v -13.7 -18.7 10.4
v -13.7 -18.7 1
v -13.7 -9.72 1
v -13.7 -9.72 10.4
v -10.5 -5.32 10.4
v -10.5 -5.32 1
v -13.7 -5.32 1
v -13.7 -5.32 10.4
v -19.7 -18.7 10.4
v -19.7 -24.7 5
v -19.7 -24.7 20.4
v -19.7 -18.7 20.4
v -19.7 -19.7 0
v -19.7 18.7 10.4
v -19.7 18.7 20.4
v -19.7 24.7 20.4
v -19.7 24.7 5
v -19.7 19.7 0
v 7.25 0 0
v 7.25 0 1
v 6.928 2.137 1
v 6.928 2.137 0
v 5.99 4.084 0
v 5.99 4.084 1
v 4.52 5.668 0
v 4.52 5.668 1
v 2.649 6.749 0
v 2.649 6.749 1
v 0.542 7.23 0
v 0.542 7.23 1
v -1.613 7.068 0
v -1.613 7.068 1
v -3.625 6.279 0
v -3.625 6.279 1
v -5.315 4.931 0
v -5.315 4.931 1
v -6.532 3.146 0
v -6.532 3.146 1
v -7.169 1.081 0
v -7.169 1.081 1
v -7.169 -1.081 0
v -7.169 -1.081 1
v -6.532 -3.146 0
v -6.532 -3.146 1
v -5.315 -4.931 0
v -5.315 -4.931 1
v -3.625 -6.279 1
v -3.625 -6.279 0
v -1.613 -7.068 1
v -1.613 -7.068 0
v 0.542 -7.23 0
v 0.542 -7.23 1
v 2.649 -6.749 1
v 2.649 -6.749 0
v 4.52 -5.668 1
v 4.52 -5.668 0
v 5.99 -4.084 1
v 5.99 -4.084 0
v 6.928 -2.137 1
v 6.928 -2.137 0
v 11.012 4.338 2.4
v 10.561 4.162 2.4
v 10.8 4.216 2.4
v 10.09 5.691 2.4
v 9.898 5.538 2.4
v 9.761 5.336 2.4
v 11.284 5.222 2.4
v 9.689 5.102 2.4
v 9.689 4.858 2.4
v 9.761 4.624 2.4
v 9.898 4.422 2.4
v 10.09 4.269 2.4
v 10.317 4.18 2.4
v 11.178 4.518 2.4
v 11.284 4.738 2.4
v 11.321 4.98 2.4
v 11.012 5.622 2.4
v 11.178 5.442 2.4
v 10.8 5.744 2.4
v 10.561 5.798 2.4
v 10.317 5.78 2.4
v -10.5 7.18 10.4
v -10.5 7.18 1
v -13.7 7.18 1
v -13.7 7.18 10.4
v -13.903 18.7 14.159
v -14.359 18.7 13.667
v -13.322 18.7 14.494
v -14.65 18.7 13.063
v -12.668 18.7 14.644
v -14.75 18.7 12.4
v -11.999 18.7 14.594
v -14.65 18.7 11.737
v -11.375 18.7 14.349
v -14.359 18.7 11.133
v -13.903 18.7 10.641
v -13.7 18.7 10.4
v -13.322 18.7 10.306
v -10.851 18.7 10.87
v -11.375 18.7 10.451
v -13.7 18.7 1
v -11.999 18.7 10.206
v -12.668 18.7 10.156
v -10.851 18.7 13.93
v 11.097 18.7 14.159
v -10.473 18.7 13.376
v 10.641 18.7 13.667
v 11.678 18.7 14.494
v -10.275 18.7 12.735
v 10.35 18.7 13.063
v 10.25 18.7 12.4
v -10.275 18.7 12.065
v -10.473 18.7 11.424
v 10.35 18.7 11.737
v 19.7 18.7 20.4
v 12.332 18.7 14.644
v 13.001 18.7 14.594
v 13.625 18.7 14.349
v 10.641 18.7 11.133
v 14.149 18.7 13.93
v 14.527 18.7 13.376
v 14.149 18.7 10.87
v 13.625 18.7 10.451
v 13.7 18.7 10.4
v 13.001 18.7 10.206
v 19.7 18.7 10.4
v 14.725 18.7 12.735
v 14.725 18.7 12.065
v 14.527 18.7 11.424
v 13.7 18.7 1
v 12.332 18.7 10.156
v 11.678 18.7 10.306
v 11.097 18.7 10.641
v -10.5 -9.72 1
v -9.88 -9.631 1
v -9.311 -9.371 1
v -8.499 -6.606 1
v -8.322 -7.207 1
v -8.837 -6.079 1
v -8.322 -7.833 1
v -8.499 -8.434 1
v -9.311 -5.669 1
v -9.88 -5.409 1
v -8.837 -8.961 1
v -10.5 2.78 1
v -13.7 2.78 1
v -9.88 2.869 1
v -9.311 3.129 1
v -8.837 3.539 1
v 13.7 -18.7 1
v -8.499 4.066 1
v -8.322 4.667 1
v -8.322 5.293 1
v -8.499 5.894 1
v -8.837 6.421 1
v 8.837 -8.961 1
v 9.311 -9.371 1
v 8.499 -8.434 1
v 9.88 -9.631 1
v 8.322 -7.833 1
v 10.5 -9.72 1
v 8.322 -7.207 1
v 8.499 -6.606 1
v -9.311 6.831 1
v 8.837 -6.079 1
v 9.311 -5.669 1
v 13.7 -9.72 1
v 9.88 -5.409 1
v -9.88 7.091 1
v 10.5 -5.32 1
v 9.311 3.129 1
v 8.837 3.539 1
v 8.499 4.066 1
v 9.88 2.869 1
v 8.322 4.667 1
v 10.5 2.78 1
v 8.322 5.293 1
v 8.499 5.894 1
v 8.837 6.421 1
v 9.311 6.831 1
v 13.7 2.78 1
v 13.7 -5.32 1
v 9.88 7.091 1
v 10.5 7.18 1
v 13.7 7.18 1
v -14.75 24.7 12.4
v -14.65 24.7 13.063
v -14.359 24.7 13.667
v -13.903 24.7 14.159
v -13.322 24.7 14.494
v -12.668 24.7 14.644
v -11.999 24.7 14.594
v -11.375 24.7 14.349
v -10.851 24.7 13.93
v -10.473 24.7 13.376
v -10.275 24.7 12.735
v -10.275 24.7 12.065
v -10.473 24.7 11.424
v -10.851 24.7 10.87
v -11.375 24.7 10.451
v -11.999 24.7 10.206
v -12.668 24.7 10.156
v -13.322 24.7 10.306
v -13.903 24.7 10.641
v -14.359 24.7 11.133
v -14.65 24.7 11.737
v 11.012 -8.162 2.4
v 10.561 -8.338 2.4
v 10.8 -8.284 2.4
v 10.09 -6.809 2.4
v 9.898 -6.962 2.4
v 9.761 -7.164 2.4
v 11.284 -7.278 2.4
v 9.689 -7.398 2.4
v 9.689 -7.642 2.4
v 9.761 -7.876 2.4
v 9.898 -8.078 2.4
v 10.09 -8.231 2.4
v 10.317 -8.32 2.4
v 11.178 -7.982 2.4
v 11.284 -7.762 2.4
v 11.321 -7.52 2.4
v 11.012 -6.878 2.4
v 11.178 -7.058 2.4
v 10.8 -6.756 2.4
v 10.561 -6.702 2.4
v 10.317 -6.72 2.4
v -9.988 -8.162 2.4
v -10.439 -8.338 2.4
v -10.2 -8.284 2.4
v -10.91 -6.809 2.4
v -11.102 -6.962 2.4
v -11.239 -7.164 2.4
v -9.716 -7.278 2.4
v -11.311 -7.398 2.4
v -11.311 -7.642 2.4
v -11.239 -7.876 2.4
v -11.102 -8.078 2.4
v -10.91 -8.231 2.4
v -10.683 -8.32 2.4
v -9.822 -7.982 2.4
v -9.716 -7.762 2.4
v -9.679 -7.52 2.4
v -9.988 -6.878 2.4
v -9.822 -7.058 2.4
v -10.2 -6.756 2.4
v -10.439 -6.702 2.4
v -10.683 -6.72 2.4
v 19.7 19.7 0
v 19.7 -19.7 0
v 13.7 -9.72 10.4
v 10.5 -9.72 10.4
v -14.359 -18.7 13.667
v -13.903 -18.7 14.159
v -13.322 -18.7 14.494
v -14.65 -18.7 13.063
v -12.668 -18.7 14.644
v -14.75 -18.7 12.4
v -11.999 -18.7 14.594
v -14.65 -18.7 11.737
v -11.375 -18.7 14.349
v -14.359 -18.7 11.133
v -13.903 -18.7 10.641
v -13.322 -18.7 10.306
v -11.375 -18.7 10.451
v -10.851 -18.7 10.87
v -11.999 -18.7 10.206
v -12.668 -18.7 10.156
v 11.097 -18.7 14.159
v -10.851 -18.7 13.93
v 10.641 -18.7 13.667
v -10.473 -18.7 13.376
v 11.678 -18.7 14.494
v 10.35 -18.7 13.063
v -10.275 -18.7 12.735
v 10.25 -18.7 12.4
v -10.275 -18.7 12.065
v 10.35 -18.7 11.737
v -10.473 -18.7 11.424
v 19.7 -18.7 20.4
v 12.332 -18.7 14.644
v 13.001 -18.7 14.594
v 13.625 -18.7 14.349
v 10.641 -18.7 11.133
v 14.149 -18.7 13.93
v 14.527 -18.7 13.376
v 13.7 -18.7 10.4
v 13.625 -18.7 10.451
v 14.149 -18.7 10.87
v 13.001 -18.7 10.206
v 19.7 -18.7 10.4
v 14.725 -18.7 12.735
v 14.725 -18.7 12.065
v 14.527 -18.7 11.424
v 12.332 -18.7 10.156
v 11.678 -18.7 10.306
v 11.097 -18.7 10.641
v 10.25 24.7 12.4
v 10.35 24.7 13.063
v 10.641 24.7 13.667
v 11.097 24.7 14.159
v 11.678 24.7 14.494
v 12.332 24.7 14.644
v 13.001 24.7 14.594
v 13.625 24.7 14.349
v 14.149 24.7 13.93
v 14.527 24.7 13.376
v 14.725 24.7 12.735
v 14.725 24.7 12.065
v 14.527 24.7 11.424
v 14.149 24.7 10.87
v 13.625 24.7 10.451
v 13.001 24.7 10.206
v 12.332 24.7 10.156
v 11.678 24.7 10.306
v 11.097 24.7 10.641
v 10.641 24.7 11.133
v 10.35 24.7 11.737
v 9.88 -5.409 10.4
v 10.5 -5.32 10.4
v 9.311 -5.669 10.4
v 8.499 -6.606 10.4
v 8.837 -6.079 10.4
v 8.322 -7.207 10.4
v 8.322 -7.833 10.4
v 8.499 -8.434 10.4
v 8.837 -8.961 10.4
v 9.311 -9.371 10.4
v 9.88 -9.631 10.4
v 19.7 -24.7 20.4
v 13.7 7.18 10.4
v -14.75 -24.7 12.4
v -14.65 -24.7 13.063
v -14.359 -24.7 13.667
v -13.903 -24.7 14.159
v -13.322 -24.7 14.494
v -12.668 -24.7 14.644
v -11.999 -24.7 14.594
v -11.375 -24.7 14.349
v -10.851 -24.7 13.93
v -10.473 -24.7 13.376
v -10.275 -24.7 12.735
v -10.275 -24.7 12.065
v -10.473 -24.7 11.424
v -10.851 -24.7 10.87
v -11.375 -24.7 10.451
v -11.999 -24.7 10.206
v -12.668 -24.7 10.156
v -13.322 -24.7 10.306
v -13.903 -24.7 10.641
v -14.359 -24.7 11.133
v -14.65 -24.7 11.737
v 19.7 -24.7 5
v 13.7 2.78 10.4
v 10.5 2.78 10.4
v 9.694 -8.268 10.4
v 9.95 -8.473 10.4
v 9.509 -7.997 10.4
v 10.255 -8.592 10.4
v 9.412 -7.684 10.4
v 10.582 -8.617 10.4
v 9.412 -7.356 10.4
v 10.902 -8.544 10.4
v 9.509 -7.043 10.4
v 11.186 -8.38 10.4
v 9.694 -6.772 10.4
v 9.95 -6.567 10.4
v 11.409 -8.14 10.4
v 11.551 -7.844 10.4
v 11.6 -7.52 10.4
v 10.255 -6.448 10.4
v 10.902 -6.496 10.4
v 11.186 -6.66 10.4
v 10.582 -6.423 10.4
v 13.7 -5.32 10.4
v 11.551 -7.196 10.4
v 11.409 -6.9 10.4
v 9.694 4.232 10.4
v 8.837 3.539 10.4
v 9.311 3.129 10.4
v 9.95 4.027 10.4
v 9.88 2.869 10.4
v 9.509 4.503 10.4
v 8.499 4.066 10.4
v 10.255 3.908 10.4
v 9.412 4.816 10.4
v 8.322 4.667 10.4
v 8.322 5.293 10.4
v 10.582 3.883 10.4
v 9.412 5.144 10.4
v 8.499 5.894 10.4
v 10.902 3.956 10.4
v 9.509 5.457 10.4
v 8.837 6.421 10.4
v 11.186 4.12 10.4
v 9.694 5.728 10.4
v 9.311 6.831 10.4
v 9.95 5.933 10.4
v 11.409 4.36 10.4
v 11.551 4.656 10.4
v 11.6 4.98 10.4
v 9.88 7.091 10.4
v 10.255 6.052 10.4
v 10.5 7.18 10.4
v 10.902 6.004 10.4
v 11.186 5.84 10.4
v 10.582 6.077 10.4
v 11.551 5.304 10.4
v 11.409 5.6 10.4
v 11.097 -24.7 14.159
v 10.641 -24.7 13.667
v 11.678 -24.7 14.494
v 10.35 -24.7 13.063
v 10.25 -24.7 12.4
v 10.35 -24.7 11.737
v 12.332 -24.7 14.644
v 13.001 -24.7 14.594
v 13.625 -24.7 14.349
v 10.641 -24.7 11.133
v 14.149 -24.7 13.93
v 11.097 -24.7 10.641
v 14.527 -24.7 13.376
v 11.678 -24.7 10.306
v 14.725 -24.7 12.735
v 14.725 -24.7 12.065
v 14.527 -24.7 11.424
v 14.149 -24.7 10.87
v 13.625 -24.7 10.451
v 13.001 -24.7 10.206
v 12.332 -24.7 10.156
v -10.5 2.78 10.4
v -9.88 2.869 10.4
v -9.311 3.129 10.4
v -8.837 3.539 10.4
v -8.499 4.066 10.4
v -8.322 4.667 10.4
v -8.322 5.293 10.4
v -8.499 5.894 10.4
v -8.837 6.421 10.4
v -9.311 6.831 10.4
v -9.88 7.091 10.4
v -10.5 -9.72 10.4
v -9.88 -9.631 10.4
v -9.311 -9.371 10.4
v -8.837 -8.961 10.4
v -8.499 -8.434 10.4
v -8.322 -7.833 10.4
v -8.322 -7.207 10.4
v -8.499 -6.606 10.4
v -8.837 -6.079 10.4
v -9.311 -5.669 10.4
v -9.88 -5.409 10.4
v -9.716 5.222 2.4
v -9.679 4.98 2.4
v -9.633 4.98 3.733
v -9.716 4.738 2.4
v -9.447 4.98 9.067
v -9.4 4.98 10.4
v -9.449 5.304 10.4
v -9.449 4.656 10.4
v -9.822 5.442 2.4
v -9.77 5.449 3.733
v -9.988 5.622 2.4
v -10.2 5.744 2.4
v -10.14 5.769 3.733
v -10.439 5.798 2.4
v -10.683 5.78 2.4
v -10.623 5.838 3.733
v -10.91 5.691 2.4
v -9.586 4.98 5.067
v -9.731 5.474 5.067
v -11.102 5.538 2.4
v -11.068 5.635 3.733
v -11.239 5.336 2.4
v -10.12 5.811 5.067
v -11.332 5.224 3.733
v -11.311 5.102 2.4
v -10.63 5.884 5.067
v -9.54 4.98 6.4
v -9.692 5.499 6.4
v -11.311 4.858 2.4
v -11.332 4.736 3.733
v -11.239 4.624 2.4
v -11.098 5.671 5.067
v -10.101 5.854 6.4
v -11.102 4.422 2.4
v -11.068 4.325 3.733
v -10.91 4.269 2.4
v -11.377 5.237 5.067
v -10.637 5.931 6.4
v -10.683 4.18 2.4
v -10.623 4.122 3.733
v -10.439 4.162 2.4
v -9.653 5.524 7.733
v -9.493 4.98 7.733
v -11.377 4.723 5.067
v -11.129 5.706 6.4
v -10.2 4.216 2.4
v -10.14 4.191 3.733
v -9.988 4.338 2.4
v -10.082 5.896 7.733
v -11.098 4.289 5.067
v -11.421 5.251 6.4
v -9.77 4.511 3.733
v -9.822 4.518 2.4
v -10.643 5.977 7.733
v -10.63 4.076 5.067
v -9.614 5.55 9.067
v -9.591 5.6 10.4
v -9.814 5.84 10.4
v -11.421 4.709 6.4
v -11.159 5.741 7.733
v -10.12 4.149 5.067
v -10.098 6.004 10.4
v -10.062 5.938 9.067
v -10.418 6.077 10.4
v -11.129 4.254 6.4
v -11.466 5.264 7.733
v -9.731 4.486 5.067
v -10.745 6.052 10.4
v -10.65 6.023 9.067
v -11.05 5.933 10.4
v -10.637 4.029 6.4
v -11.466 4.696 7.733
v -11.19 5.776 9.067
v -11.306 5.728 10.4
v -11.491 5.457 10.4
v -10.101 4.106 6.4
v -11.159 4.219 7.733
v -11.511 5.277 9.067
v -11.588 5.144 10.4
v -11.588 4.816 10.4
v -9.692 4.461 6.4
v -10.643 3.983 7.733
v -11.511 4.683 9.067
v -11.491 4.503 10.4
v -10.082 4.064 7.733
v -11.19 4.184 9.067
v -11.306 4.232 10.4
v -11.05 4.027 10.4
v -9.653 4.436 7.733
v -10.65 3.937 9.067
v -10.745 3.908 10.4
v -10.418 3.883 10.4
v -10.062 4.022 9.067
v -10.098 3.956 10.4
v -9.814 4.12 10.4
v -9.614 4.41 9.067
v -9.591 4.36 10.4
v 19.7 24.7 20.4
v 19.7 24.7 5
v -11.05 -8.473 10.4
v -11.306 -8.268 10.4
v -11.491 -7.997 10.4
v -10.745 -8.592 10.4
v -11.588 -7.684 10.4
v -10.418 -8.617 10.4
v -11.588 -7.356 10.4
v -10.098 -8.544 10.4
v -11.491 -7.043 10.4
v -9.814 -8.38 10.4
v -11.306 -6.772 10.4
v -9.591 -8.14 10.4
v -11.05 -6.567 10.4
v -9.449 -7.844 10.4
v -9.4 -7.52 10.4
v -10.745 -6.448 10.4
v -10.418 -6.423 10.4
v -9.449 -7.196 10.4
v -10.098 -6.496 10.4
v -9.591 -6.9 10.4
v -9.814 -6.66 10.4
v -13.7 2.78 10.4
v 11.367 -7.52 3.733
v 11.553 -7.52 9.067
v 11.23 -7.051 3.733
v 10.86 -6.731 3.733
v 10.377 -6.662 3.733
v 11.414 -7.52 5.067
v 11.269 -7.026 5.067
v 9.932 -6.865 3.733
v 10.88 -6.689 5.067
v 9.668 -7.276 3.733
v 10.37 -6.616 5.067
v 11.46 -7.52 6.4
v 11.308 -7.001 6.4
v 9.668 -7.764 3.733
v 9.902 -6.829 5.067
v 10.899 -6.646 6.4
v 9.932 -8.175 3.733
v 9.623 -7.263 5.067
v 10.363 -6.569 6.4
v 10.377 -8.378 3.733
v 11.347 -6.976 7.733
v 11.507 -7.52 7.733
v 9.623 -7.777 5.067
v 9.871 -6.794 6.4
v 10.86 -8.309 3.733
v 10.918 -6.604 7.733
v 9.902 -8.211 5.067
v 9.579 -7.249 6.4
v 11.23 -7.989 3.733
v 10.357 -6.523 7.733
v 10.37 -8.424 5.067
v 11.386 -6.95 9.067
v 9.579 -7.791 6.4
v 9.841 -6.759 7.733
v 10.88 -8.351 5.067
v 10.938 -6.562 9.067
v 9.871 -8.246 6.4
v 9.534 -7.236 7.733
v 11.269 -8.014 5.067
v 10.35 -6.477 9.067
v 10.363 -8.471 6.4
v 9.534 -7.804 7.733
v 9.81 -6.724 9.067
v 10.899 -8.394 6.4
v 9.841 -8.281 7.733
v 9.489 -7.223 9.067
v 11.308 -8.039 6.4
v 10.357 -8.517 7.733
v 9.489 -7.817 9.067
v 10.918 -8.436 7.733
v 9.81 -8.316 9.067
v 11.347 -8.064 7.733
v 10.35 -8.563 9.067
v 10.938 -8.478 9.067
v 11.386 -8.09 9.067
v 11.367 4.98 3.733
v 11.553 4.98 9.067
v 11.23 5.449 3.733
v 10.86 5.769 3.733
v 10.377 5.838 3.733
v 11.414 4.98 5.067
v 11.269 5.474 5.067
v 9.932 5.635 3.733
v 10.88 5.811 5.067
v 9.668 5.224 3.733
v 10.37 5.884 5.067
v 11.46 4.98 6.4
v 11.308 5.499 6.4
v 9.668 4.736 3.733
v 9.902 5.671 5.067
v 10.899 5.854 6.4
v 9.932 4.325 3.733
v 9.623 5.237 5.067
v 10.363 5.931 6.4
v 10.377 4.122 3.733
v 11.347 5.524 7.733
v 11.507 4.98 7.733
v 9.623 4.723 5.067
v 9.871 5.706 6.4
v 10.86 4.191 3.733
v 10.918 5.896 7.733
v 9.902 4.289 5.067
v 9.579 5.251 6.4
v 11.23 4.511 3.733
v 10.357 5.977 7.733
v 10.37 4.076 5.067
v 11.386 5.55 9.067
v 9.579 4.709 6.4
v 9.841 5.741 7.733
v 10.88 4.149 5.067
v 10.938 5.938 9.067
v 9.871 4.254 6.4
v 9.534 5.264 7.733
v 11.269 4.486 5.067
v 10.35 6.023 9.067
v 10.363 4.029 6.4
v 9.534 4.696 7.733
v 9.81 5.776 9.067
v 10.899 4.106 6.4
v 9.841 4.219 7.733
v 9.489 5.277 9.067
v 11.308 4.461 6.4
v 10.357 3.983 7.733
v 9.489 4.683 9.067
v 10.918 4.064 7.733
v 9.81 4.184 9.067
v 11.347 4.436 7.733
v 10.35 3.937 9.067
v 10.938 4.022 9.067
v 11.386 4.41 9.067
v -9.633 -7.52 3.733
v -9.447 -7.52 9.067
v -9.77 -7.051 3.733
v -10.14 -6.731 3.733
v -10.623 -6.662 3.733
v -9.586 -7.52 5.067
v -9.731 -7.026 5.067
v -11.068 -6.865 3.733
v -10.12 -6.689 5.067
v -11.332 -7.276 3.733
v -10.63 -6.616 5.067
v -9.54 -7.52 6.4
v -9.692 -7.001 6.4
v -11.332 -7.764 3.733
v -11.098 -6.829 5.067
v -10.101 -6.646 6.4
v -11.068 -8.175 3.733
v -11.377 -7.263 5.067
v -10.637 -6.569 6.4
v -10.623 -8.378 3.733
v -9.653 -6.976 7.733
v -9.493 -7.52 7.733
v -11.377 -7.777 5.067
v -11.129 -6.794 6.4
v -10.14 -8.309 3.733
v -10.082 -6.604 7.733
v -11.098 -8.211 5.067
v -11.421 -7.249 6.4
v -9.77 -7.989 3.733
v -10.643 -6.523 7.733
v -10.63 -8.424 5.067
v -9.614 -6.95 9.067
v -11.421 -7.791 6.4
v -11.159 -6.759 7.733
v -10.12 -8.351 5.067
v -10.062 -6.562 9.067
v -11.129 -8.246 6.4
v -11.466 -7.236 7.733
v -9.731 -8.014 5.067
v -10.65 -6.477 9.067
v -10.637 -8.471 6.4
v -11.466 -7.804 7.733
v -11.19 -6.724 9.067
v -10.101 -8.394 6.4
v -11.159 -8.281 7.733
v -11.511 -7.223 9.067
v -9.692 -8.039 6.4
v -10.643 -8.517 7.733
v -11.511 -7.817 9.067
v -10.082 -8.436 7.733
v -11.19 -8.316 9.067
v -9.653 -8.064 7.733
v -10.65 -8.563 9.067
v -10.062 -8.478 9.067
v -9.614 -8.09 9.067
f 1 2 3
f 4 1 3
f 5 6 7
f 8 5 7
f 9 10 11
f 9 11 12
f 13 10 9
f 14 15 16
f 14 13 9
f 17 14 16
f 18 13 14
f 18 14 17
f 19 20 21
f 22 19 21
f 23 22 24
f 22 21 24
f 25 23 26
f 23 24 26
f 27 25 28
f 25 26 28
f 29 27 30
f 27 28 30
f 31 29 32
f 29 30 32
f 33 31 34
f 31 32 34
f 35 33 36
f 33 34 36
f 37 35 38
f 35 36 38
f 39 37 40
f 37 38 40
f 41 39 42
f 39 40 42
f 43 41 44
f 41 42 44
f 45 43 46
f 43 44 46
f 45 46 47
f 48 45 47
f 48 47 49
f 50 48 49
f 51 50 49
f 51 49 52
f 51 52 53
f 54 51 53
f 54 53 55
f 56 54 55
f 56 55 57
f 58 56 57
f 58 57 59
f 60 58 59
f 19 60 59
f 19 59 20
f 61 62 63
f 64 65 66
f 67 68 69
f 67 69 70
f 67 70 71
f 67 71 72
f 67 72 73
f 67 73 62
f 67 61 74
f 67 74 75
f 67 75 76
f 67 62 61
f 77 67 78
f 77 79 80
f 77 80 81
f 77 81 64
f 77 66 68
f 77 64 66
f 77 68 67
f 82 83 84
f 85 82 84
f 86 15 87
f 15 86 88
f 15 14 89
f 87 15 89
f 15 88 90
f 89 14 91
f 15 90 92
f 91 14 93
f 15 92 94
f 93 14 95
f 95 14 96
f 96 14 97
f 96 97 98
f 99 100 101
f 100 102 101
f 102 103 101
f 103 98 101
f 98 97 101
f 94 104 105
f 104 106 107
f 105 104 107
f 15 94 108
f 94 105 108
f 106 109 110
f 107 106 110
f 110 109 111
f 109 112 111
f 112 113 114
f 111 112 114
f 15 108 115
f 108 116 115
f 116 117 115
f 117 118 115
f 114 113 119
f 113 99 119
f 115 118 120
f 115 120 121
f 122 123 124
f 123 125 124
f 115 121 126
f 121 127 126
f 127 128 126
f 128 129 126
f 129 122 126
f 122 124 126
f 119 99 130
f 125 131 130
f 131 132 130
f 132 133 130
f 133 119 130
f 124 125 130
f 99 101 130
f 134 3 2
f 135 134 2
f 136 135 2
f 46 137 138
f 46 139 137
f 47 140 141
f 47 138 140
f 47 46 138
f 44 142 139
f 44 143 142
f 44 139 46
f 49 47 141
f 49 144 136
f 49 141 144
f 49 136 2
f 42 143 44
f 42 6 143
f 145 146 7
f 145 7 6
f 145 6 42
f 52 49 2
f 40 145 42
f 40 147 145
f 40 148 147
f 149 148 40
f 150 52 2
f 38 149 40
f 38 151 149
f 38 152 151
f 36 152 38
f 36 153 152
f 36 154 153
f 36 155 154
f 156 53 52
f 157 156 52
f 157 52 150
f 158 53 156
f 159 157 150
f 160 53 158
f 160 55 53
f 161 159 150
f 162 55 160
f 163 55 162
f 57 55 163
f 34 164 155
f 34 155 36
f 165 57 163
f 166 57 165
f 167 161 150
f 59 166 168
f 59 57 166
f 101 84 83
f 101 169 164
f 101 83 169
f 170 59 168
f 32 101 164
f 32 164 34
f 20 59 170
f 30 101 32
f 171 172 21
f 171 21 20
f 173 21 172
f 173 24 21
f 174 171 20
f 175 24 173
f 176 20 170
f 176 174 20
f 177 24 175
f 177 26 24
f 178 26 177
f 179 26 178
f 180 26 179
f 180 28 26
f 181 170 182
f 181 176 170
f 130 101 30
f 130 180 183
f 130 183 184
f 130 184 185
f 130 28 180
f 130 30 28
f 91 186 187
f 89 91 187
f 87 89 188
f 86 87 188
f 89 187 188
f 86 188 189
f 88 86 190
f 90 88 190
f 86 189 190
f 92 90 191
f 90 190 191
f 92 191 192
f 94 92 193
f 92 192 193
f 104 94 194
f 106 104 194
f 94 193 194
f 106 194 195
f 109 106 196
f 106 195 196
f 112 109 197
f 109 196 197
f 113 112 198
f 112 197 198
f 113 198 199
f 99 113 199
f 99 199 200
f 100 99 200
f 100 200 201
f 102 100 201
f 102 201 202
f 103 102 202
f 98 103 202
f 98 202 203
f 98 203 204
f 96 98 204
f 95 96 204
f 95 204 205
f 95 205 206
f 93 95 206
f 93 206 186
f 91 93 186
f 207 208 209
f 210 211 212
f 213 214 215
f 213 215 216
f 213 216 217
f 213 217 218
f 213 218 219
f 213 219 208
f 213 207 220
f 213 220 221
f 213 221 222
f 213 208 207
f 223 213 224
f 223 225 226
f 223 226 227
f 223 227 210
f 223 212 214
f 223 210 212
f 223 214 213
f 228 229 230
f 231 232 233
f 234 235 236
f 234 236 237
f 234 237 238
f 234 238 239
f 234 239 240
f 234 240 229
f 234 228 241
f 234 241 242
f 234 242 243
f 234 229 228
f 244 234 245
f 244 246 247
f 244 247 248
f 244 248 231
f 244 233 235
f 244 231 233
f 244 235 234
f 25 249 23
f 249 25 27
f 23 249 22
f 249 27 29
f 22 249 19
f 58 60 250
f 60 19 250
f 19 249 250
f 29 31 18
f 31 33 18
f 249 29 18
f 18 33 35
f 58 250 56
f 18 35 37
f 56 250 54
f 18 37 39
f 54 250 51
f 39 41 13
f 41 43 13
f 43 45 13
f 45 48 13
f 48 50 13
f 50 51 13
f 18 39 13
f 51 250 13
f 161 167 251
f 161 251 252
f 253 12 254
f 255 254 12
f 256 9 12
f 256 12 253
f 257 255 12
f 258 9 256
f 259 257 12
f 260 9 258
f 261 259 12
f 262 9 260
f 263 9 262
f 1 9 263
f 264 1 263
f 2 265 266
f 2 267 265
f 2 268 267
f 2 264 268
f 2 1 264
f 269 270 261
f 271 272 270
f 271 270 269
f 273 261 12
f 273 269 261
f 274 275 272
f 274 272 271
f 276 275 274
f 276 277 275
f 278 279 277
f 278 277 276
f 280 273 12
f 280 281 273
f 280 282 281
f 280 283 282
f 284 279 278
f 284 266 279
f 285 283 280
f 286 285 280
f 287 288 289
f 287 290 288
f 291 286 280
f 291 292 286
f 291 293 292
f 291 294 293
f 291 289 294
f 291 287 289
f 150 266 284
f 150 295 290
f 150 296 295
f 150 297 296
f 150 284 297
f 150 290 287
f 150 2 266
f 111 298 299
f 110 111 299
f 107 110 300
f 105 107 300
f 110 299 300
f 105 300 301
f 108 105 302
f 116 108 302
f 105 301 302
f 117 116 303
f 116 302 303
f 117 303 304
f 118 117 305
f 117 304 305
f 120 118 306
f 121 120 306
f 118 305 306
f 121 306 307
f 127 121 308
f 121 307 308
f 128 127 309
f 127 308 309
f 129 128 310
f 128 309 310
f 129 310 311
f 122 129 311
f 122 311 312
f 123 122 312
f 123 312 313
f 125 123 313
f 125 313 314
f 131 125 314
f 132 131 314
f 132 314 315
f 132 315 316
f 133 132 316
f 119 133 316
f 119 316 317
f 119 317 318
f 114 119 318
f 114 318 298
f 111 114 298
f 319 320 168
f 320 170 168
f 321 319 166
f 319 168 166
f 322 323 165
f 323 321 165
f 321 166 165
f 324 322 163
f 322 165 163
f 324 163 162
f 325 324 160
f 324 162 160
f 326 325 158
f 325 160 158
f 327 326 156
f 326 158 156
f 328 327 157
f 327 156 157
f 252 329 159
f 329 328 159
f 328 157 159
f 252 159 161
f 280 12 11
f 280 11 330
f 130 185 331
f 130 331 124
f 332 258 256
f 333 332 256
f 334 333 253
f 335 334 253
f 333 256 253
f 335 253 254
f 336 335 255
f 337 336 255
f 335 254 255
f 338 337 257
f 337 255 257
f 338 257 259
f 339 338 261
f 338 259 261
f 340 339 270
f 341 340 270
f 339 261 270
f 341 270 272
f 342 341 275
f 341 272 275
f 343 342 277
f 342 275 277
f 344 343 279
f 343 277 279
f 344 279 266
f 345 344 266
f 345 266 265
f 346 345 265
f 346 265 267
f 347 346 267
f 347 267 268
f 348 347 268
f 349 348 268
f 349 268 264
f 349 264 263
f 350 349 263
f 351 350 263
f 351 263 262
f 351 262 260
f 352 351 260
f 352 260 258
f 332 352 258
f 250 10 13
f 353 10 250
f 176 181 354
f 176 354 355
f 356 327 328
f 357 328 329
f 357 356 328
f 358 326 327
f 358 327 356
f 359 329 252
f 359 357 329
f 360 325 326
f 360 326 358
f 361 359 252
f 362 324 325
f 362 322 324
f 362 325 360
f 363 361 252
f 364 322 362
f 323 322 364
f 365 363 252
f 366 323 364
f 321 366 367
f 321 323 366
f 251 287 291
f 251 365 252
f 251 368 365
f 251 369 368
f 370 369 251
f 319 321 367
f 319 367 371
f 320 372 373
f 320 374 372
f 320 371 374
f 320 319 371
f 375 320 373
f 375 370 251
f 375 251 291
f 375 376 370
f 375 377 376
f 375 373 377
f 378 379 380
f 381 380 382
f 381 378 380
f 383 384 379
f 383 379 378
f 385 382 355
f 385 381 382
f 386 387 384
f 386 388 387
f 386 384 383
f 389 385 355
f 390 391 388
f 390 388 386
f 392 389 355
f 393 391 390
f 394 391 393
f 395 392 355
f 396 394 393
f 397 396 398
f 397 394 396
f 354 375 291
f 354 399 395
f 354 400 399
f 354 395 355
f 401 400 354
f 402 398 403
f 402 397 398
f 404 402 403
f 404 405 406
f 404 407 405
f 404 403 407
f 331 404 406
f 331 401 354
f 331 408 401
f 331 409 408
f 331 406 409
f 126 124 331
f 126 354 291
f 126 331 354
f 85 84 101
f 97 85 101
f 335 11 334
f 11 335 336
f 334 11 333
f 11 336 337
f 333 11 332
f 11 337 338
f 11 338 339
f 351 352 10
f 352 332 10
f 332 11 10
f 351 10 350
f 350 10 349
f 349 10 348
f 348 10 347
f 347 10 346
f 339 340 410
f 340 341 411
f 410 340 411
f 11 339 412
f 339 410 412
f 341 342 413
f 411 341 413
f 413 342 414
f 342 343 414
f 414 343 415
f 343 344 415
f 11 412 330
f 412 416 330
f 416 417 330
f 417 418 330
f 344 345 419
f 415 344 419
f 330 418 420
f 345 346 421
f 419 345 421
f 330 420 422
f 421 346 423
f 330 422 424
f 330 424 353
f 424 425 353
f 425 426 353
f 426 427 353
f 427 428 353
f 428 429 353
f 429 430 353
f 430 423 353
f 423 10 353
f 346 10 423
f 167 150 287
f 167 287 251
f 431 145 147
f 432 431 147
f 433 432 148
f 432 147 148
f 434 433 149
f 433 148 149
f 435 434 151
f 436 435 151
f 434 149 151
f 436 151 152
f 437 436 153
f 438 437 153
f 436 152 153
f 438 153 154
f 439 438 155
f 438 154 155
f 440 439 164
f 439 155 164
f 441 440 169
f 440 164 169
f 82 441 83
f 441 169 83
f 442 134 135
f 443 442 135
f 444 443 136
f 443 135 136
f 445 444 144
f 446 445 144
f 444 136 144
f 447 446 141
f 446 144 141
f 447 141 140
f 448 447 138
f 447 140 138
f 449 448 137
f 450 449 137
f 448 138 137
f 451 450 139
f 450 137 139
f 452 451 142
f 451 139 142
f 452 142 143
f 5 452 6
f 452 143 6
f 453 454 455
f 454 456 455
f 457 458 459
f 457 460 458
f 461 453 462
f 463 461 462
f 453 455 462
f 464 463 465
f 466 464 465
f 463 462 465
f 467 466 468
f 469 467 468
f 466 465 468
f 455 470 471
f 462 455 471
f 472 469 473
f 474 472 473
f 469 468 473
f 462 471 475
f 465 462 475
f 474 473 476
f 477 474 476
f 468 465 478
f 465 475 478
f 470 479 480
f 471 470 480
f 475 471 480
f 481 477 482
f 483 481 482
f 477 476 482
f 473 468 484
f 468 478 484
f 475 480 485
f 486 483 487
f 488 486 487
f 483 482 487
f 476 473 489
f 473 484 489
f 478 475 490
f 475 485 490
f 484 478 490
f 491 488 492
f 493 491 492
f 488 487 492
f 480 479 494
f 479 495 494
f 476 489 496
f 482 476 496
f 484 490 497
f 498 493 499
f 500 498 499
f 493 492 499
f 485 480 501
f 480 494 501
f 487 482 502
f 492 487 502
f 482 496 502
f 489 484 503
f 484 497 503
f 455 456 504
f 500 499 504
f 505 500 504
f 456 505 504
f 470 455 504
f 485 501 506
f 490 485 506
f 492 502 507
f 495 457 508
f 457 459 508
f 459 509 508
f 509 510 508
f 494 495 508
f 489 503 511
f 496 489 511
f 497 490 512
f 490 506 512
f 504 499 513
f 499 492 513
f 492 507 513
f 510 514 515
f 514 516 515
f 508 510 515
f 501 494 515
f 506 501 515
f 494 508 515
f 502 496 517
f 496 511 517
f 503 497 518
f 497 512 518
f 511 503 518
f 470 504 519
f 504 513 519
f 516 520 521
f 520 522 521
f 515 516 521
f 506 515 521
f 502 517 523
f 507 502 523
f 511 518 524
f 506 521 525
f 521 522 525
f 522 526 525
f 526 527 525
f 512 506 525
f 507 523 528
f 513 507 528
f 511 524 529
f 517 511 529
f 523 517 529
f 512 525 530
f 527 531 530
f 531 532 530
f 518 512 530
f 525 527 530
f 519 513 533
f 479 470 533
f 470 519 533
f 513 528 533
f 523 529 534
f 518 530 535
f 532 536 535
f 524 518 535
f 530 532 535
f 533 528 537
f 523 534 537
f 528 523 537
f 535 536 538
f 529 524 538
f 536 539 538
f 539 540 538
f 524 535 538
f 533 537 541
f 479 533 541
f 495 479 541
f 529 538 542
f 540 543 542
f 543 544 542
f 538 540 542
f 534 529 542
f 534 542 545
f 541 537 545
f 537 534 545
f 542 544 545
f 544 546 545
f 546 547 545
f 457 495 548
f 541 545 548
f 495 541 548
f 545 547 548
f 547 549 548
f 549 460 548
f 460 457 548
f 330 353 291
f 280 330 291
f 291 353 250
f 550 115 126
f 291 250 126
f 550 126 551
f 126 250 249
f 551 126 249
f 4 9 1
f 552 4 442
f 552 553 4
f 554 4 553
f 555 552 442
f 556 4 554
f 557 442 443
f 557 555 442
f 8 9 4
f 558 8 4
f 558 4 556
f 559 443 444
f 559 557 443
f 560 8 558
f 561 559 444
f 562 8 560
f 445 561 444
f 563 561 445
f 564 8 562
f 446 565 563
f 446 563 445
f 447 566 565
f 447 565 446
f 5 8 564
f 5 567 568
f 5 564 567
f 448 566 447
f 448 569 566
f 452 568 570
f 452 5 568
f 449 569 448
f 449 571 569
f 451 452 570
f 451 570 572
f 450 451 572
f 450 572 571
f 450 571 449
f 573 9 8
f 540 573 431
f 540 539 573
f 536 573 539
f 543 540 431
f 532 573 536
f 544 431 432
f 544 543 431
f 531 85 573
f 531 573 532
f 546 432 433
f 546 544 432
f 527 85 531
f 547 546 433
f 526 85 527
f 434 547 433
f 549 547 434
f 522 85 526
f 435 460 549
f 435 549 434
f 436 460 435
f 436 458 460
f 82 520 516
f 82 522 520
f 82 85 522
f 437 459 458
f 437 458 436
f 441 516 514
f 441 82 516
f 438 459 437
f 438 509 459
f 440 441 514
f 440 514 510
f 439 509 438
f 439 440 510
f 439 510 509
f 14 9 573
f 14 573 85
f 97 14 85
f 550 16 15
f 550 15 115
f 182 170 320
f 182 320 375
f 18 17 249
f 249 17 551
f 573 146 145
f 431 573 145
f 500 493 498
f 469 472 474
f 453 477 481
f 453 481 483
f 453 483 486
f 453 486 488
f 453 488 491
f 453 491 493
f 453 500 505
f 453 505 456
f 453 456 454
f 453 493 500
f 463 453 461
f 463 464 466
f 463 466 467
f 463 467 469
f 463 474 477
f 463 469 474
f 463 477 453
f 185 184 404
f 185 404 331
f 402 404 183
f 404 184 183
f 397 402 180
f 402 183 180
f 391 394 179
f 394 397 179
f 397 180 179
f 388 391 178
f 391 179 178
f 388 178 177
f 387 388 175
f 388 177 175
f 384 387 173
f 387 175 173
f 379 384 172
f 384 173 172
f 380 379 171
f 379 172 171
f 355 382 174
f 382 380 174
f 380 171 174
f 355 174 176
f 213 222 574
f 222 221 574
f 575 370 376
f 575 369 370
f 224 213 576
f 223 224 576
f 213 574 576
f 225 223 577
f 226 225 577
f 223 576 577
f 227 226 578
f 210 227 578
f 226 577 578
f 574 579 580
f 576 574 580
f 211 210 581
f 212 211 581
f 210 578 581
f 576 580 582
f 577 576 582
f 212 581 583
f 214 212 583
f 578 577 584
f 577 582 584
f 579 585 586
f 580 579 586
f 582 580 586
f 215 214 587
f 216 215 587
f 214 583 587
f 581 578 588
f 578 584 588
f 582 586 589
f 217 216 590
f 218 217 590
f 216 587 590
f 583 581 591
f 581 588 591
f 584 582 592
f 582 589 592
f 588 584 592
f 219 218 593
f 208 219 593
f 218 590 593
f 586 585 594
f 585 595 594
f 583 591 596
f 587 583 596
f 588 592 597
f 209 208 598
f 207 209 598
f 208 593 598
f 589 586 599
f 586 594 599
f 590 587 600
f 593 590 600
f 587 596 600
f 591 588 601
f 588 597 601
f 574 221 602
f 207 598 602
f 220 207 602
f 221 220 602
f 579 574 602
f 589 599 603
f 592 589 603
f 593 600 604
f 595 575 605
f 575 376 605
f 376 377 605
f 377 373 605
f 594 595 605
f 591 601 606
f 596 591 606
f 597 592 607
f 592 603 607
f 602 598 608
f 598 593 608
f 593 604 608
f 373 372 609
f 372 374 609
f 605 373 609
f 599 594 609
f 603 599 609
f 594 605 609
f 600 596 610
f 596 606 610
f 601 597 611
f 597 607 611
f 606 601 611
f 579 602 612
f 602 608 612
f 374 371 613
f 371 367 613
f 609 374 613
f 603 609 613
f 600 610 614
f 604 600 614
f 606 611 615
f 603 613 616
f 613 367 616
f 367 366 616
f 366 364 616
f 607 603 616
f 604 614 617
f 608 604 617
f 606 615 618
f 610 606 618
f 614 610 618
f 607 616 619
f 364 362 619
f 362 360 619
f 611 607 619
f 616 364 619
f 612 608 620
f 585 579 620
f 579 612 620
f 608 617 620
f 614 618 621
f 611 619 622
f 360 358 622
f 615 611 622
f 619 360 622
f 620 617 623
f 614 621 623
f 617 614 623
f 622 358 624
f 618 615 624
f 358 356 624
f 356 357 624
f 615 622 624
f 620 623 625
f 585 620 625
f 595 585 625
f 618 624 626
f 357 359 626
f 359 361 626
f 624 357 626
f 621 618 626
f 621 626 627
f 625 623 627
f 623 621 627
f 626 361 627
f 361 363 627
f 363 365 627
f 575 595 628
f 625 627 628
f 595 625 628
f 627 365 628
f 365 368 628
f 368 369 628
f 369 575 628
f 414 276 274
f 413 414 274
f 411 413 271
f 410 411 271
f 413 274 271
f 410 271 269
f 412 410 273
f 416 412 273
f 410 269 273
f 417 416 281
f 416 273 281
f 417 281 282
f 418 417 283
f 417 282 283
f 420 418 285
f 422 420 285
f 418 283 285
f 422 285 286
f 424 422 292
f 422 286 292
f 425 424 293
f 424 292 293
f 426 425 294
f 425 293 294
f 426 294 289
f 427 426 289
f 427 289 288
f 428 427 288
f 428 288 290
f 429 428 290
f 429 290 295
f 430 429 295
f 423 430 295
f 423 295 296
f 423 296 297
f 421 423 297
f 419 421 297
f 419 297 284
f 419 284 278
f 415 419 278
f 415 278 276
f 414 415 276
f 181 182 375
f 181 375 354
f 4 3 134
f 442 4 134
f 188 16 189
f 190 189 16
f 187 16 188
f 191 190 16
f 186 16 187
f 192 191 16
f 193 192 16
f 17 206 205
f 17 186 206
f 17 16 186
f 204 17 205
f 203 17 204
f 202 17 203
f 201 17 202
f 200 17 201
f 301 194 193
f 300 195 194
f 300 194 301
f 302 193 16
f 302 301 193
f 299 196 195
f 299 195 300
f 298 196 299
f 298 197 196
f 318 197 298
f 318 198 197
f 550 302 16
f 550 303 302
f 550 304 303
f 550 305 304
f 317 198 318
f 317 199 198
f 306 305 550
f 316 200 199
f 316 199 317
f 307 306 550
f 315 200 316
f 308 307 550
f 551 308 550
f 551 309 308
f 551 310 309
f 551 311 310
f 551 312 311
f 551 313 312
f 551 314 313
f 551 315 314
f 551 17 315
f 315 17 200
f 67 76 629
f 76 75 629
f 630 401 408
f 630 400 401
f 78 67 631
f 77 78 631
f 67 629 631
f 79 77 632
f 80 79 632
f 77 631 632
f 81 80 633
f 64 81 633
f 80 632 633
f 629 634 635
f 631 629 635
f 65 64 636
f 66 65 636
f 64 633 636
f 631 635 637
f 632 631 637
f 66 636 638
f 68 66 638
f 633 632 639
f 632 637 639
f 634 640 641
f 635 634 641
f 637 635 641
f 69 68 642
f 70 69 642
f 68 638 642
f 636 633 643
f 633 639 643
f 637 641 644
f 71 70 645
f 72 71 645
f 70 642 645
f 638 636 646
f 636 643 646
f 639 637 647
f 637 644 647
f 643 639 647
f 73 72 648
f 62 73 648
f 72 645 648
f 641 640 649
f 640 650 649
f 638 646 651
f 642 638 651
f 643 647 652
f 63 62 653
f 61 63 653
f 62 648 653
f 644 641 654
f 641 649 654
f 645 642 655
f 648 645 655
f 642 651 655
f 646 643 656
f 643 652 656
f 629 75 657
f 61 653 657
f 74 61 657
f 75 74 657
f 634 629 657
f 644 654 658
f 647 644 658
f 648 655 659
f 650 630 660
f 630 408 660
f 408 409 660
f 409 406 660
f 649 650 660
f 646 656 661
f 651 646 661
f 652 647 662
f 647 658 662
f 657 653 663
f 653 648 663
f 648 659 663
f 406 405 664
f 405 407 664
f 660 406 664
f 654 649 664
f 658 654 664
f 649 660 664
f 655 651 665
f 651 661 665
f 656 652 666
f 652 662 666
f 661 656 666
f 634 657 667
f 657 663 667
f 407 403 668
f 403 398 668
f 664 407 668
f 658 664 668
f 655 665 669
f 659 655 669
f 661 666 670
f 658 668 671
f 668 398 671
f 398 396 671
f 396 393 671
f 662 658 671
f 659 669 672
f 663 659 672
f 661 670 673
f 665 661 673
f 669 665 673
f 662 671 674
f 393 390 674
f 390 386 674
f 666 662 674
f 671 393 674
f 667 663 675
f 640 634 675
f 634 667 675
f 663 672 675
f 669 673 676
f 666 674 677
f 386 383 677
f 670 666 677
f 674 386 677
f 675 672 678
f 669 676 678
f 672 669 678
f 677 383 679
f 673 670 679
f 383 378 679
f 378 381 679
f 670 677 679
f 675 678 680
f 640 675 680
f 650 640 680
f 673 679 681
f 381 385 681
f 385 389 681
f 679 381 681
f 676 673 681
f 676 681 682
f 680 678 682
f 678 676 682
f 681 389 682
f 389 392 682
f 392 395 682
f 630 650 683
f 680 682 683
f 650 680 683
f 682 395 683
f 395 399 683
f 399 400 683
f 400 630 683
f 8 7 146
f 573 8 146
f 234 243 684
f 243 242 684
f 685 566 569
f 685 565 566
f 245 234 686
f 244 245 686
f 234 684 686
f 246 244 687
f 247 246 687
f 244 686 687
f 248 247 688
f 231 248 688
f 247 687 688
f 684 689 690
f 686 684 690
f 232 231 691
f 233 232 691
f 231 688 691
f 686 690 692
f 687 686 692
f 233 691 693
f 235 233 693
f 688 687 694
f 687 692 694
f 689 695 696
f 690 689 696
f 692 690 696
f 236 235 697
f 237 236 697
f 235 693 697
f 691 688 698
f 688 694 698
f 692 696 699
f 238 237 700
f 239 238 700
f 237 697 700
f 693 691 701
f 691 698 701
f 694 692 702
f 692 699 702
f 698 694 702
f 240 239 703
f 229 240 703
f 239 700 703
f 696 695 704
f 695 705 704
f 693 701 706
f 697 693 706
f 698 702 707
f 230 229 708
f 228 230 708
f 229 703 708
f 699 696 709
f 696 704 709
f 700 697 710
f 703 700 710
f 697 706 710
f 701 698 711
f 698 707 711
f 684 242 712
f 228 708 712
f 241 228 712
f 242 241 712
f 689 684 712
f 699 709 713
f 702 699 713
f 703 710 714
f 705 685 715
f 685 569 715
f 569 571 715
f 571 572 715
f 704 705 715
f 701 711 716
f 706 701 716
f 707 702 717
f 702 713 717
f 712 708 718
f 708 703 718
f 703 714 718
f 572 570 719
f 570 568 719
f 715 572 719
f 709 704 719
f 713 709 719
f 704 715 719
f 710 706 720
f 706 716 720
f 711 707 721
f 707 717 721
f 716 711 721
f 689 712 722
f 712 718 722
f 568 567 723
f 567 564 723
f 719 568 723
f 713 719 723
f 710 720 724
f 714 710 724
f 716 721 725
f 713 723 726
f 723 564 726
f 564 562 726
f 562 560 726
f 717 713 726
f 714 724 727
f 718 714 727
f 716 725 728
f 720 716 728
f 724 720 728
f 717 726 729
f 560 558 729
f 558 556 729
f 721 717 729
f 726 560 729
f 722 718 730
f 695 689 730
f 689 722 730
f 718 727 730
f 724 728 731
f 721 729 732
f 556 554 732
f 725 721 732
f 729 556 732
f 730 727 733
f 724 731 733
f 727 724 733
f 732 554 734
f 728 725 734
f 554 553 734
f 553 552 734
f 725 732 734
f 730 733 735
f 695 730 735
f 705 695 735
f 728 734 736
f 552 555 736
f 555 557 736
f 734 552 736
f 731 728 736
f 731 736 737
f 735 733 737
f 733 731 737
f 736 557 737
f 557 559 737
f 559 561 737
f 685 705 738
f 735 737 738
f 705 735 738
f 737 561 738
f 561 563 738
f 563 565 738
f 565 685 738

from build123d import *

# Parameters (mm, degrees)
SKETCH1_W                    = 39.4
SKETCH1_H                    = 49.4
BOSS_EXTRUDE1_DEPTH          = 1
SKETCH2_R                    = 7.25
CUT_EXTRUDE1_DEPTH           = 32.609808604
BOSS_EXTRUDE2_START          = -1
SKETCH3_R                    = 2.2
SKETCH3_R_2                  = 1
BOSS_EXTRUDE2_DEPTH          = 10.4
SKETCH4_W                    = 39.4
SKETCH4_H                    = 49.4
SKETCH4_W_2                  = 27.4
SKETCH4_H_2                  = 37.4
BOSS_EXTRUDE4_DEPTH          = 9.4
SKETCH5_W                    = 39.4
SKETCH5_H                    = 6
BOSS_EXTRUDE5_DEPTH          = 10
SKETCH6_R                    = 1.65
CUT_EXTRUDE3_DEPTH           = 57.961478211
SKETCH7_R                    = 2.25
CUT_EXTRUDE4_DEPTH           = 57.961478211
BOSS_EXTRUDE6_START          = -9.4
BOSS_EXTRUDE6_DEPTH          = 9.4
SKETCH9_R                    = 1.1
CUT_EXTRUDE5_DEPTH           = 8
CUT_EXTRUDE5_DRAFT           = -2
CUT_EXTRUDE5_PROFILE_2_DEPTH = 8
CUT_EXTRUDE5_PROFILE_2_DRAFT = -2
CUT_EXTRUDE5_PROFILE_3_DEPTH = 8
CUT_EXTRUDE5_PROFILE_3_DRAFT = -2
CUT_EXTRUDE5_PROFILE_4_DEPTH = 8
CUT_EXTRUDE5_PROFILE_4_DRAFT = -2
CHAMFER1_SIZE                = 5


with BuildPart() as part:
    # Sketch1 → Boss-Extrude1 (new body)
    with BuildSketch(Plane.XY):
        Rectangle(SKETCH1_W, SKETCH1_H)
    extrude(amount=BOSS_EXTRUDE1_DEPTH)

    # Sketch2 → Cut-Extrude1 (cut, through all)
    with BuildSketch(Plane.XY.offset(1)):
        Circle(SKETCH2_R)
    extrude(amount=-CUT_EXTRUDE1_DEPTH, mode=Mode.SUBTRACT)

    # Sketch3 → Boss-Extrude2 (add)
    # profile 1 of 4: a face of its own
    with BuildSketch(Plane.XY.offset(1).offset(BOSS_EXTRUDE2_START)):
        with Locations(Location((-10.5, 4.98, 0), (0, 0, 180))):
            Circle(SKETCH3_R)
        with Locations(Location((-10.5, 4.98, 0), (0, 0, 180))):
            Circle(SKETCH3_R_2, mode=Mode.SUBTRACT)
    # profile 2 of 4: a face of its own
    with BuildSketch(Plane.XY.offset(1).offset(BOSS_EXTRUDE2_START)):
        with Locations(Location((-10.5, -7.52, 0), (0, 0, 180))):
            Circle(SKETCH3_R)
        with Locations(Location((-10.5, -7.52, 0), (0, 0, 180))):
            Circle(SKETCH3_R_2, mode=Mode.SUBTRACT)
    # profile 3 of 4: a face of its own
    with BuildSketch(Plane.XY.offset(1).offset(BOSS_EXTRUDE2_START)):
        with Locations(Location((10.5, -7.52, 0), (0, 0, 180))):
            Circle(SKETCH3_R)
        with Locations(Location((10.5, -7.52, 0), (0, 0, 180))):
            Circle(SKETCH3_R_2, mode=Mode.SUBTRACT)
    # profile 4 of 4: a face of its own
    with BuildSketch(Plane.XY.offset(1).offset(BOSS_EXTRUDE2_START)):
        with Locations(Location((10.5, 4.98, 0), (0, 0, 180))):
            Circle(SKETCH3_R)
        with Locations(Location((10.5, 4.98, 0), (0, 0, 180))):
            Circle(SKETCH3_R_2, mode=Mode.SUBTRACT)
    extrude(amount=BOSS_EXTRUDE2_DEPTH)

    # Sketch4 → Boss-Extrude4 (add)
    with BuildSketch(Plane.XY.offset(1)):
        Rectangle(SKETCH4_W, SKETCH4_H)
        Rectangle(SKETCH4_W_2, SKETCH4_H_2, mode=Mode.SUBTRACT)
    extrude(amount=BOSS_EXTRUDE4_DEPTH)

    # Sketch5 → Boss-Extrude5 (add)
    with BuildSketch(Plane.XY.offset(10.4)):
        with Locations((0, 21.7)):
            Rectangle(SKETCH5_W, SKETCH5_H)
        with Locations((0, -21.7)):
            Rectangle(SKETCH5_W, SKETCH5_H)
    extrude(amount=BOSS_EXTRUDE5_DEPTH)

    # Sketch6 → Cut-Extrude3 (cut, through all)
    with BuildSketch(Plane(origin=(0, 24.7, 0), x_dir=(1, 0, 0), z_dir=(0, 1, 0))):
        with Locations(Location((-12.5, -12.4, 0), (0, 0, 180))):
            Circle(SKETCH6_R)
        with Locations(Location((12.5, -12.4, 0), (0, 0, 180))):
            Circle(SKETCH6_R)
    extrude(amount=-CUT_EXTRUDE3_DEPTH, mode=Mode.SUBTRACT)

    # Sketch7 → Cut-Extrude4 (cut, through all)
    with BuildSketch(Plane(origin=(0, 24.7, 0), x_dir=(1, 0, 0), z_dir=(0, 1, 0))):
        with Locations(Location((12.5, -12.4, 0), (0, 0, 180))):
            Circle(SKETCH7_R)
        with Locations(Location((-12.5, -12.4, 0), (0, 0, 180))):
            Circle(SKETCH7_R)
    extrude(amount=-CUT_EXTRUDE4_DEPTH, mode=Mode.SUBTRACT)

    # Sketch8 → Boss-Extrude6 (add)
    with BuildSketch(Plane.XY.offset(10.4).offset(BOSS_EXTRUDE6_START)):
        with BuildLine():
            Line((-10.5, 7.18), (-13.7, 7.18))
            Line((-13.7, 7.18), (-13.7, 2.78))
            Line((-13.7, 2.78), (-10.5, 2.78))
            ThreePointArc((-10.5, 2.78), (-8.3, 4.98), (-10.5, 7.18))
        make_face()
        with BuildLine():
            Line((-10.5, -5.32), (-13.7, -5.32))
            Line((-13.7, -5.32), (-13.7, -9.72))
            Line((-13.7, -9.72), (-10.5, -9.72))
            ThreePointArc((-10.5, -9.72), (-8.3, -7.52), (-10.5, -5.32))
        make_face()
        with BuildLine():
            Line((10.5, 7.18), (13.7, 7.18))
            Line((13.7, 7.18), (13.7, 2.78))
            Line((13.7, 2.78), (10.5, 2.78))
            ThreePointArc((10.5, 2.78), (8.3, 4.98), (10.5, 7.18))
        make_face()
        with BuildLine():
            Line((10.5, -5.32), (13.7, -5.32))
            Line((13.7, -5.32), (13.7, -9.72))
            Line((13.7, -9.72), (10.5, -9.72))
            ThreePointArc((10.5, -9.72), (8.3, -7.52), (10.5, -5.32))
        make_face()
    extrude(amount=BOSS_EXTRUDE6_DEPTH)


with BuildPart() as cut_extrude5_tool:
    # Sketch9 → Cut-Extrude5 (with draft: the straight prism first)
    with BuildSketch(Plane.XY.offset(10.4)):
        with Locations((-10.5, 4.98)):
            Circle(SKETCH9_R)
    extrude(amount=-CUT_EXTRUDE5_DEPTH)
    # Cut-Extrude5: the draft: its side faces are tilted about the plane it starts from
    cut_extrude5_sides = [cut_extrude5_tool.faces().sort_by_distance(p)[0] for p in [
        (-11.6, 4.98, 6.4),
    ]]
    draft(cut_extrude5_sides, Plane.XY.offset(10.4), CUT_EXTRUDE5_DRAFT)


with BuildPart() as part_1:
    add(part.part)

    # Cut-Extrude5: cut by cut_extrude5_tool
    add(cut_extrude5_tool.part, mode=Mode.SUBTRACT)


with BuildPart() as cut_extrude5_profile_2_tool:
    # Sketch9 → Cut-Extrude5 profile 2 (with draft: the straight prism first)
    with BuildSketch(Plane.XY.offset(10.4)):
        with Locations((10.5, 4.98)):
            Circle(SKETCH9_R)
    extrude(amount=-CUT_EXTRUDE5_PROFILE_2_DEPTH)
    # Cut-Extrude5 profile 2: the draft: its side faces are tilted about the plane it starts from
    cut_extrude5_profile_2_sides = [cut_extrude5_profile_2_tool.faces().sort_by_distance(p)[0] for p in [
        (9.4, 4.98, 6.4),
    ]]
    draft(cut_extrude5_profile_2_sides, Plane.XY.offset(10.4), CUT_EXTRUDE5_PROFILE_2_DRAFT)


with BuildPart() as part_2:
    add(part_1.part)

    # Cut-Extrude5 profile 2: cut by cut_extrude5_profile_2_tool
    add(cut_extrude5_profile_2_tool.part, mode=Mode.SUBTRACT)


with BuildPart() as cut_extrude5_profile_3_tool:
    # Sketch9 → Cut-Extrude5 profile 3 (with draft: the straight prism first)
    with BuildSketch(Plane.XY.offset(10.4)):
        with Locations((10.5, -7.52)):
            Circle(SKETCH9_R)
    extrude(amount=-CUT_EXTRUDE5_PROFILE_3_DEPTH)
    # Cut-Extrude5 profile 3: the draft: its side faces are tilted about the plane it starts from
    cut_extrude5_profile_3_sides = [cut_extrude5_profile_3_tool.faces().sort_by_distance(p)[0] for p in [
        (9.4, -7.52, 6.4),
    ]]
    draft(cut_extrude5_profile_3_sides, Plane.XY.offset(10.4), CUT_EXTRUDE5_PROFILE_3_DRAFT)


with BuildPart() as part_3:
    add(part_2.part)

    # Cut-Extrude5 profile 3: cut by cut_extrude5_profile_3_tool
    add(cut_extrude5_profile_3_tool.part, mode=Mode.SUBTRACT)


with BuildPart() as cut_extrude5_profile_4_tool:
    # Sketch9 → Cut-Extrude5 profile 4 (with draft: the straight prism first)
    with BuildSketch(Plane.XY.offset(10.4)):
        with Locations((-10.5, -7.52)):
            Circle(SKETCH9_R)
    extrude(amount=-CUT_EXTRUDE5_PROFILE_4_DEPTH)
    # Cut-Extrude5 profile 4: the draft: its side faces are tilted about the plane it starts from
    cut_extrude5_profile_4_sides = [cut_extrude5_profile_4_tool.faces().sort_by_distance(p)[0] for p in [
        (-11.6, -7.52, 6.4),
    ]]
    draft(cut_extrude5_profile_4_sides, Plane.XY.offset(10.4), CUT_EXTRUDE5_PROFILE_4_DRAFT)


with BuildPart() as part_4:
    add(part_3.part)

    # Cut-Extrude5 profile 4: cut by cut_extrude5_profile_4_tool
    add(cut_extrude5_profile_4_tool.part, mode=Mode.SUBTRACT)

    # Chamfer1
    chamfer1_edges = [part_4.edges().sort_by_distance(p)[0] for p in [
        (0, 24.7, 0),
        (0, -24.7, 0),
    ]]
    chamfer(chamfer1_edges, length=CHAMFER1_SIZE)


solid = part_4.part
